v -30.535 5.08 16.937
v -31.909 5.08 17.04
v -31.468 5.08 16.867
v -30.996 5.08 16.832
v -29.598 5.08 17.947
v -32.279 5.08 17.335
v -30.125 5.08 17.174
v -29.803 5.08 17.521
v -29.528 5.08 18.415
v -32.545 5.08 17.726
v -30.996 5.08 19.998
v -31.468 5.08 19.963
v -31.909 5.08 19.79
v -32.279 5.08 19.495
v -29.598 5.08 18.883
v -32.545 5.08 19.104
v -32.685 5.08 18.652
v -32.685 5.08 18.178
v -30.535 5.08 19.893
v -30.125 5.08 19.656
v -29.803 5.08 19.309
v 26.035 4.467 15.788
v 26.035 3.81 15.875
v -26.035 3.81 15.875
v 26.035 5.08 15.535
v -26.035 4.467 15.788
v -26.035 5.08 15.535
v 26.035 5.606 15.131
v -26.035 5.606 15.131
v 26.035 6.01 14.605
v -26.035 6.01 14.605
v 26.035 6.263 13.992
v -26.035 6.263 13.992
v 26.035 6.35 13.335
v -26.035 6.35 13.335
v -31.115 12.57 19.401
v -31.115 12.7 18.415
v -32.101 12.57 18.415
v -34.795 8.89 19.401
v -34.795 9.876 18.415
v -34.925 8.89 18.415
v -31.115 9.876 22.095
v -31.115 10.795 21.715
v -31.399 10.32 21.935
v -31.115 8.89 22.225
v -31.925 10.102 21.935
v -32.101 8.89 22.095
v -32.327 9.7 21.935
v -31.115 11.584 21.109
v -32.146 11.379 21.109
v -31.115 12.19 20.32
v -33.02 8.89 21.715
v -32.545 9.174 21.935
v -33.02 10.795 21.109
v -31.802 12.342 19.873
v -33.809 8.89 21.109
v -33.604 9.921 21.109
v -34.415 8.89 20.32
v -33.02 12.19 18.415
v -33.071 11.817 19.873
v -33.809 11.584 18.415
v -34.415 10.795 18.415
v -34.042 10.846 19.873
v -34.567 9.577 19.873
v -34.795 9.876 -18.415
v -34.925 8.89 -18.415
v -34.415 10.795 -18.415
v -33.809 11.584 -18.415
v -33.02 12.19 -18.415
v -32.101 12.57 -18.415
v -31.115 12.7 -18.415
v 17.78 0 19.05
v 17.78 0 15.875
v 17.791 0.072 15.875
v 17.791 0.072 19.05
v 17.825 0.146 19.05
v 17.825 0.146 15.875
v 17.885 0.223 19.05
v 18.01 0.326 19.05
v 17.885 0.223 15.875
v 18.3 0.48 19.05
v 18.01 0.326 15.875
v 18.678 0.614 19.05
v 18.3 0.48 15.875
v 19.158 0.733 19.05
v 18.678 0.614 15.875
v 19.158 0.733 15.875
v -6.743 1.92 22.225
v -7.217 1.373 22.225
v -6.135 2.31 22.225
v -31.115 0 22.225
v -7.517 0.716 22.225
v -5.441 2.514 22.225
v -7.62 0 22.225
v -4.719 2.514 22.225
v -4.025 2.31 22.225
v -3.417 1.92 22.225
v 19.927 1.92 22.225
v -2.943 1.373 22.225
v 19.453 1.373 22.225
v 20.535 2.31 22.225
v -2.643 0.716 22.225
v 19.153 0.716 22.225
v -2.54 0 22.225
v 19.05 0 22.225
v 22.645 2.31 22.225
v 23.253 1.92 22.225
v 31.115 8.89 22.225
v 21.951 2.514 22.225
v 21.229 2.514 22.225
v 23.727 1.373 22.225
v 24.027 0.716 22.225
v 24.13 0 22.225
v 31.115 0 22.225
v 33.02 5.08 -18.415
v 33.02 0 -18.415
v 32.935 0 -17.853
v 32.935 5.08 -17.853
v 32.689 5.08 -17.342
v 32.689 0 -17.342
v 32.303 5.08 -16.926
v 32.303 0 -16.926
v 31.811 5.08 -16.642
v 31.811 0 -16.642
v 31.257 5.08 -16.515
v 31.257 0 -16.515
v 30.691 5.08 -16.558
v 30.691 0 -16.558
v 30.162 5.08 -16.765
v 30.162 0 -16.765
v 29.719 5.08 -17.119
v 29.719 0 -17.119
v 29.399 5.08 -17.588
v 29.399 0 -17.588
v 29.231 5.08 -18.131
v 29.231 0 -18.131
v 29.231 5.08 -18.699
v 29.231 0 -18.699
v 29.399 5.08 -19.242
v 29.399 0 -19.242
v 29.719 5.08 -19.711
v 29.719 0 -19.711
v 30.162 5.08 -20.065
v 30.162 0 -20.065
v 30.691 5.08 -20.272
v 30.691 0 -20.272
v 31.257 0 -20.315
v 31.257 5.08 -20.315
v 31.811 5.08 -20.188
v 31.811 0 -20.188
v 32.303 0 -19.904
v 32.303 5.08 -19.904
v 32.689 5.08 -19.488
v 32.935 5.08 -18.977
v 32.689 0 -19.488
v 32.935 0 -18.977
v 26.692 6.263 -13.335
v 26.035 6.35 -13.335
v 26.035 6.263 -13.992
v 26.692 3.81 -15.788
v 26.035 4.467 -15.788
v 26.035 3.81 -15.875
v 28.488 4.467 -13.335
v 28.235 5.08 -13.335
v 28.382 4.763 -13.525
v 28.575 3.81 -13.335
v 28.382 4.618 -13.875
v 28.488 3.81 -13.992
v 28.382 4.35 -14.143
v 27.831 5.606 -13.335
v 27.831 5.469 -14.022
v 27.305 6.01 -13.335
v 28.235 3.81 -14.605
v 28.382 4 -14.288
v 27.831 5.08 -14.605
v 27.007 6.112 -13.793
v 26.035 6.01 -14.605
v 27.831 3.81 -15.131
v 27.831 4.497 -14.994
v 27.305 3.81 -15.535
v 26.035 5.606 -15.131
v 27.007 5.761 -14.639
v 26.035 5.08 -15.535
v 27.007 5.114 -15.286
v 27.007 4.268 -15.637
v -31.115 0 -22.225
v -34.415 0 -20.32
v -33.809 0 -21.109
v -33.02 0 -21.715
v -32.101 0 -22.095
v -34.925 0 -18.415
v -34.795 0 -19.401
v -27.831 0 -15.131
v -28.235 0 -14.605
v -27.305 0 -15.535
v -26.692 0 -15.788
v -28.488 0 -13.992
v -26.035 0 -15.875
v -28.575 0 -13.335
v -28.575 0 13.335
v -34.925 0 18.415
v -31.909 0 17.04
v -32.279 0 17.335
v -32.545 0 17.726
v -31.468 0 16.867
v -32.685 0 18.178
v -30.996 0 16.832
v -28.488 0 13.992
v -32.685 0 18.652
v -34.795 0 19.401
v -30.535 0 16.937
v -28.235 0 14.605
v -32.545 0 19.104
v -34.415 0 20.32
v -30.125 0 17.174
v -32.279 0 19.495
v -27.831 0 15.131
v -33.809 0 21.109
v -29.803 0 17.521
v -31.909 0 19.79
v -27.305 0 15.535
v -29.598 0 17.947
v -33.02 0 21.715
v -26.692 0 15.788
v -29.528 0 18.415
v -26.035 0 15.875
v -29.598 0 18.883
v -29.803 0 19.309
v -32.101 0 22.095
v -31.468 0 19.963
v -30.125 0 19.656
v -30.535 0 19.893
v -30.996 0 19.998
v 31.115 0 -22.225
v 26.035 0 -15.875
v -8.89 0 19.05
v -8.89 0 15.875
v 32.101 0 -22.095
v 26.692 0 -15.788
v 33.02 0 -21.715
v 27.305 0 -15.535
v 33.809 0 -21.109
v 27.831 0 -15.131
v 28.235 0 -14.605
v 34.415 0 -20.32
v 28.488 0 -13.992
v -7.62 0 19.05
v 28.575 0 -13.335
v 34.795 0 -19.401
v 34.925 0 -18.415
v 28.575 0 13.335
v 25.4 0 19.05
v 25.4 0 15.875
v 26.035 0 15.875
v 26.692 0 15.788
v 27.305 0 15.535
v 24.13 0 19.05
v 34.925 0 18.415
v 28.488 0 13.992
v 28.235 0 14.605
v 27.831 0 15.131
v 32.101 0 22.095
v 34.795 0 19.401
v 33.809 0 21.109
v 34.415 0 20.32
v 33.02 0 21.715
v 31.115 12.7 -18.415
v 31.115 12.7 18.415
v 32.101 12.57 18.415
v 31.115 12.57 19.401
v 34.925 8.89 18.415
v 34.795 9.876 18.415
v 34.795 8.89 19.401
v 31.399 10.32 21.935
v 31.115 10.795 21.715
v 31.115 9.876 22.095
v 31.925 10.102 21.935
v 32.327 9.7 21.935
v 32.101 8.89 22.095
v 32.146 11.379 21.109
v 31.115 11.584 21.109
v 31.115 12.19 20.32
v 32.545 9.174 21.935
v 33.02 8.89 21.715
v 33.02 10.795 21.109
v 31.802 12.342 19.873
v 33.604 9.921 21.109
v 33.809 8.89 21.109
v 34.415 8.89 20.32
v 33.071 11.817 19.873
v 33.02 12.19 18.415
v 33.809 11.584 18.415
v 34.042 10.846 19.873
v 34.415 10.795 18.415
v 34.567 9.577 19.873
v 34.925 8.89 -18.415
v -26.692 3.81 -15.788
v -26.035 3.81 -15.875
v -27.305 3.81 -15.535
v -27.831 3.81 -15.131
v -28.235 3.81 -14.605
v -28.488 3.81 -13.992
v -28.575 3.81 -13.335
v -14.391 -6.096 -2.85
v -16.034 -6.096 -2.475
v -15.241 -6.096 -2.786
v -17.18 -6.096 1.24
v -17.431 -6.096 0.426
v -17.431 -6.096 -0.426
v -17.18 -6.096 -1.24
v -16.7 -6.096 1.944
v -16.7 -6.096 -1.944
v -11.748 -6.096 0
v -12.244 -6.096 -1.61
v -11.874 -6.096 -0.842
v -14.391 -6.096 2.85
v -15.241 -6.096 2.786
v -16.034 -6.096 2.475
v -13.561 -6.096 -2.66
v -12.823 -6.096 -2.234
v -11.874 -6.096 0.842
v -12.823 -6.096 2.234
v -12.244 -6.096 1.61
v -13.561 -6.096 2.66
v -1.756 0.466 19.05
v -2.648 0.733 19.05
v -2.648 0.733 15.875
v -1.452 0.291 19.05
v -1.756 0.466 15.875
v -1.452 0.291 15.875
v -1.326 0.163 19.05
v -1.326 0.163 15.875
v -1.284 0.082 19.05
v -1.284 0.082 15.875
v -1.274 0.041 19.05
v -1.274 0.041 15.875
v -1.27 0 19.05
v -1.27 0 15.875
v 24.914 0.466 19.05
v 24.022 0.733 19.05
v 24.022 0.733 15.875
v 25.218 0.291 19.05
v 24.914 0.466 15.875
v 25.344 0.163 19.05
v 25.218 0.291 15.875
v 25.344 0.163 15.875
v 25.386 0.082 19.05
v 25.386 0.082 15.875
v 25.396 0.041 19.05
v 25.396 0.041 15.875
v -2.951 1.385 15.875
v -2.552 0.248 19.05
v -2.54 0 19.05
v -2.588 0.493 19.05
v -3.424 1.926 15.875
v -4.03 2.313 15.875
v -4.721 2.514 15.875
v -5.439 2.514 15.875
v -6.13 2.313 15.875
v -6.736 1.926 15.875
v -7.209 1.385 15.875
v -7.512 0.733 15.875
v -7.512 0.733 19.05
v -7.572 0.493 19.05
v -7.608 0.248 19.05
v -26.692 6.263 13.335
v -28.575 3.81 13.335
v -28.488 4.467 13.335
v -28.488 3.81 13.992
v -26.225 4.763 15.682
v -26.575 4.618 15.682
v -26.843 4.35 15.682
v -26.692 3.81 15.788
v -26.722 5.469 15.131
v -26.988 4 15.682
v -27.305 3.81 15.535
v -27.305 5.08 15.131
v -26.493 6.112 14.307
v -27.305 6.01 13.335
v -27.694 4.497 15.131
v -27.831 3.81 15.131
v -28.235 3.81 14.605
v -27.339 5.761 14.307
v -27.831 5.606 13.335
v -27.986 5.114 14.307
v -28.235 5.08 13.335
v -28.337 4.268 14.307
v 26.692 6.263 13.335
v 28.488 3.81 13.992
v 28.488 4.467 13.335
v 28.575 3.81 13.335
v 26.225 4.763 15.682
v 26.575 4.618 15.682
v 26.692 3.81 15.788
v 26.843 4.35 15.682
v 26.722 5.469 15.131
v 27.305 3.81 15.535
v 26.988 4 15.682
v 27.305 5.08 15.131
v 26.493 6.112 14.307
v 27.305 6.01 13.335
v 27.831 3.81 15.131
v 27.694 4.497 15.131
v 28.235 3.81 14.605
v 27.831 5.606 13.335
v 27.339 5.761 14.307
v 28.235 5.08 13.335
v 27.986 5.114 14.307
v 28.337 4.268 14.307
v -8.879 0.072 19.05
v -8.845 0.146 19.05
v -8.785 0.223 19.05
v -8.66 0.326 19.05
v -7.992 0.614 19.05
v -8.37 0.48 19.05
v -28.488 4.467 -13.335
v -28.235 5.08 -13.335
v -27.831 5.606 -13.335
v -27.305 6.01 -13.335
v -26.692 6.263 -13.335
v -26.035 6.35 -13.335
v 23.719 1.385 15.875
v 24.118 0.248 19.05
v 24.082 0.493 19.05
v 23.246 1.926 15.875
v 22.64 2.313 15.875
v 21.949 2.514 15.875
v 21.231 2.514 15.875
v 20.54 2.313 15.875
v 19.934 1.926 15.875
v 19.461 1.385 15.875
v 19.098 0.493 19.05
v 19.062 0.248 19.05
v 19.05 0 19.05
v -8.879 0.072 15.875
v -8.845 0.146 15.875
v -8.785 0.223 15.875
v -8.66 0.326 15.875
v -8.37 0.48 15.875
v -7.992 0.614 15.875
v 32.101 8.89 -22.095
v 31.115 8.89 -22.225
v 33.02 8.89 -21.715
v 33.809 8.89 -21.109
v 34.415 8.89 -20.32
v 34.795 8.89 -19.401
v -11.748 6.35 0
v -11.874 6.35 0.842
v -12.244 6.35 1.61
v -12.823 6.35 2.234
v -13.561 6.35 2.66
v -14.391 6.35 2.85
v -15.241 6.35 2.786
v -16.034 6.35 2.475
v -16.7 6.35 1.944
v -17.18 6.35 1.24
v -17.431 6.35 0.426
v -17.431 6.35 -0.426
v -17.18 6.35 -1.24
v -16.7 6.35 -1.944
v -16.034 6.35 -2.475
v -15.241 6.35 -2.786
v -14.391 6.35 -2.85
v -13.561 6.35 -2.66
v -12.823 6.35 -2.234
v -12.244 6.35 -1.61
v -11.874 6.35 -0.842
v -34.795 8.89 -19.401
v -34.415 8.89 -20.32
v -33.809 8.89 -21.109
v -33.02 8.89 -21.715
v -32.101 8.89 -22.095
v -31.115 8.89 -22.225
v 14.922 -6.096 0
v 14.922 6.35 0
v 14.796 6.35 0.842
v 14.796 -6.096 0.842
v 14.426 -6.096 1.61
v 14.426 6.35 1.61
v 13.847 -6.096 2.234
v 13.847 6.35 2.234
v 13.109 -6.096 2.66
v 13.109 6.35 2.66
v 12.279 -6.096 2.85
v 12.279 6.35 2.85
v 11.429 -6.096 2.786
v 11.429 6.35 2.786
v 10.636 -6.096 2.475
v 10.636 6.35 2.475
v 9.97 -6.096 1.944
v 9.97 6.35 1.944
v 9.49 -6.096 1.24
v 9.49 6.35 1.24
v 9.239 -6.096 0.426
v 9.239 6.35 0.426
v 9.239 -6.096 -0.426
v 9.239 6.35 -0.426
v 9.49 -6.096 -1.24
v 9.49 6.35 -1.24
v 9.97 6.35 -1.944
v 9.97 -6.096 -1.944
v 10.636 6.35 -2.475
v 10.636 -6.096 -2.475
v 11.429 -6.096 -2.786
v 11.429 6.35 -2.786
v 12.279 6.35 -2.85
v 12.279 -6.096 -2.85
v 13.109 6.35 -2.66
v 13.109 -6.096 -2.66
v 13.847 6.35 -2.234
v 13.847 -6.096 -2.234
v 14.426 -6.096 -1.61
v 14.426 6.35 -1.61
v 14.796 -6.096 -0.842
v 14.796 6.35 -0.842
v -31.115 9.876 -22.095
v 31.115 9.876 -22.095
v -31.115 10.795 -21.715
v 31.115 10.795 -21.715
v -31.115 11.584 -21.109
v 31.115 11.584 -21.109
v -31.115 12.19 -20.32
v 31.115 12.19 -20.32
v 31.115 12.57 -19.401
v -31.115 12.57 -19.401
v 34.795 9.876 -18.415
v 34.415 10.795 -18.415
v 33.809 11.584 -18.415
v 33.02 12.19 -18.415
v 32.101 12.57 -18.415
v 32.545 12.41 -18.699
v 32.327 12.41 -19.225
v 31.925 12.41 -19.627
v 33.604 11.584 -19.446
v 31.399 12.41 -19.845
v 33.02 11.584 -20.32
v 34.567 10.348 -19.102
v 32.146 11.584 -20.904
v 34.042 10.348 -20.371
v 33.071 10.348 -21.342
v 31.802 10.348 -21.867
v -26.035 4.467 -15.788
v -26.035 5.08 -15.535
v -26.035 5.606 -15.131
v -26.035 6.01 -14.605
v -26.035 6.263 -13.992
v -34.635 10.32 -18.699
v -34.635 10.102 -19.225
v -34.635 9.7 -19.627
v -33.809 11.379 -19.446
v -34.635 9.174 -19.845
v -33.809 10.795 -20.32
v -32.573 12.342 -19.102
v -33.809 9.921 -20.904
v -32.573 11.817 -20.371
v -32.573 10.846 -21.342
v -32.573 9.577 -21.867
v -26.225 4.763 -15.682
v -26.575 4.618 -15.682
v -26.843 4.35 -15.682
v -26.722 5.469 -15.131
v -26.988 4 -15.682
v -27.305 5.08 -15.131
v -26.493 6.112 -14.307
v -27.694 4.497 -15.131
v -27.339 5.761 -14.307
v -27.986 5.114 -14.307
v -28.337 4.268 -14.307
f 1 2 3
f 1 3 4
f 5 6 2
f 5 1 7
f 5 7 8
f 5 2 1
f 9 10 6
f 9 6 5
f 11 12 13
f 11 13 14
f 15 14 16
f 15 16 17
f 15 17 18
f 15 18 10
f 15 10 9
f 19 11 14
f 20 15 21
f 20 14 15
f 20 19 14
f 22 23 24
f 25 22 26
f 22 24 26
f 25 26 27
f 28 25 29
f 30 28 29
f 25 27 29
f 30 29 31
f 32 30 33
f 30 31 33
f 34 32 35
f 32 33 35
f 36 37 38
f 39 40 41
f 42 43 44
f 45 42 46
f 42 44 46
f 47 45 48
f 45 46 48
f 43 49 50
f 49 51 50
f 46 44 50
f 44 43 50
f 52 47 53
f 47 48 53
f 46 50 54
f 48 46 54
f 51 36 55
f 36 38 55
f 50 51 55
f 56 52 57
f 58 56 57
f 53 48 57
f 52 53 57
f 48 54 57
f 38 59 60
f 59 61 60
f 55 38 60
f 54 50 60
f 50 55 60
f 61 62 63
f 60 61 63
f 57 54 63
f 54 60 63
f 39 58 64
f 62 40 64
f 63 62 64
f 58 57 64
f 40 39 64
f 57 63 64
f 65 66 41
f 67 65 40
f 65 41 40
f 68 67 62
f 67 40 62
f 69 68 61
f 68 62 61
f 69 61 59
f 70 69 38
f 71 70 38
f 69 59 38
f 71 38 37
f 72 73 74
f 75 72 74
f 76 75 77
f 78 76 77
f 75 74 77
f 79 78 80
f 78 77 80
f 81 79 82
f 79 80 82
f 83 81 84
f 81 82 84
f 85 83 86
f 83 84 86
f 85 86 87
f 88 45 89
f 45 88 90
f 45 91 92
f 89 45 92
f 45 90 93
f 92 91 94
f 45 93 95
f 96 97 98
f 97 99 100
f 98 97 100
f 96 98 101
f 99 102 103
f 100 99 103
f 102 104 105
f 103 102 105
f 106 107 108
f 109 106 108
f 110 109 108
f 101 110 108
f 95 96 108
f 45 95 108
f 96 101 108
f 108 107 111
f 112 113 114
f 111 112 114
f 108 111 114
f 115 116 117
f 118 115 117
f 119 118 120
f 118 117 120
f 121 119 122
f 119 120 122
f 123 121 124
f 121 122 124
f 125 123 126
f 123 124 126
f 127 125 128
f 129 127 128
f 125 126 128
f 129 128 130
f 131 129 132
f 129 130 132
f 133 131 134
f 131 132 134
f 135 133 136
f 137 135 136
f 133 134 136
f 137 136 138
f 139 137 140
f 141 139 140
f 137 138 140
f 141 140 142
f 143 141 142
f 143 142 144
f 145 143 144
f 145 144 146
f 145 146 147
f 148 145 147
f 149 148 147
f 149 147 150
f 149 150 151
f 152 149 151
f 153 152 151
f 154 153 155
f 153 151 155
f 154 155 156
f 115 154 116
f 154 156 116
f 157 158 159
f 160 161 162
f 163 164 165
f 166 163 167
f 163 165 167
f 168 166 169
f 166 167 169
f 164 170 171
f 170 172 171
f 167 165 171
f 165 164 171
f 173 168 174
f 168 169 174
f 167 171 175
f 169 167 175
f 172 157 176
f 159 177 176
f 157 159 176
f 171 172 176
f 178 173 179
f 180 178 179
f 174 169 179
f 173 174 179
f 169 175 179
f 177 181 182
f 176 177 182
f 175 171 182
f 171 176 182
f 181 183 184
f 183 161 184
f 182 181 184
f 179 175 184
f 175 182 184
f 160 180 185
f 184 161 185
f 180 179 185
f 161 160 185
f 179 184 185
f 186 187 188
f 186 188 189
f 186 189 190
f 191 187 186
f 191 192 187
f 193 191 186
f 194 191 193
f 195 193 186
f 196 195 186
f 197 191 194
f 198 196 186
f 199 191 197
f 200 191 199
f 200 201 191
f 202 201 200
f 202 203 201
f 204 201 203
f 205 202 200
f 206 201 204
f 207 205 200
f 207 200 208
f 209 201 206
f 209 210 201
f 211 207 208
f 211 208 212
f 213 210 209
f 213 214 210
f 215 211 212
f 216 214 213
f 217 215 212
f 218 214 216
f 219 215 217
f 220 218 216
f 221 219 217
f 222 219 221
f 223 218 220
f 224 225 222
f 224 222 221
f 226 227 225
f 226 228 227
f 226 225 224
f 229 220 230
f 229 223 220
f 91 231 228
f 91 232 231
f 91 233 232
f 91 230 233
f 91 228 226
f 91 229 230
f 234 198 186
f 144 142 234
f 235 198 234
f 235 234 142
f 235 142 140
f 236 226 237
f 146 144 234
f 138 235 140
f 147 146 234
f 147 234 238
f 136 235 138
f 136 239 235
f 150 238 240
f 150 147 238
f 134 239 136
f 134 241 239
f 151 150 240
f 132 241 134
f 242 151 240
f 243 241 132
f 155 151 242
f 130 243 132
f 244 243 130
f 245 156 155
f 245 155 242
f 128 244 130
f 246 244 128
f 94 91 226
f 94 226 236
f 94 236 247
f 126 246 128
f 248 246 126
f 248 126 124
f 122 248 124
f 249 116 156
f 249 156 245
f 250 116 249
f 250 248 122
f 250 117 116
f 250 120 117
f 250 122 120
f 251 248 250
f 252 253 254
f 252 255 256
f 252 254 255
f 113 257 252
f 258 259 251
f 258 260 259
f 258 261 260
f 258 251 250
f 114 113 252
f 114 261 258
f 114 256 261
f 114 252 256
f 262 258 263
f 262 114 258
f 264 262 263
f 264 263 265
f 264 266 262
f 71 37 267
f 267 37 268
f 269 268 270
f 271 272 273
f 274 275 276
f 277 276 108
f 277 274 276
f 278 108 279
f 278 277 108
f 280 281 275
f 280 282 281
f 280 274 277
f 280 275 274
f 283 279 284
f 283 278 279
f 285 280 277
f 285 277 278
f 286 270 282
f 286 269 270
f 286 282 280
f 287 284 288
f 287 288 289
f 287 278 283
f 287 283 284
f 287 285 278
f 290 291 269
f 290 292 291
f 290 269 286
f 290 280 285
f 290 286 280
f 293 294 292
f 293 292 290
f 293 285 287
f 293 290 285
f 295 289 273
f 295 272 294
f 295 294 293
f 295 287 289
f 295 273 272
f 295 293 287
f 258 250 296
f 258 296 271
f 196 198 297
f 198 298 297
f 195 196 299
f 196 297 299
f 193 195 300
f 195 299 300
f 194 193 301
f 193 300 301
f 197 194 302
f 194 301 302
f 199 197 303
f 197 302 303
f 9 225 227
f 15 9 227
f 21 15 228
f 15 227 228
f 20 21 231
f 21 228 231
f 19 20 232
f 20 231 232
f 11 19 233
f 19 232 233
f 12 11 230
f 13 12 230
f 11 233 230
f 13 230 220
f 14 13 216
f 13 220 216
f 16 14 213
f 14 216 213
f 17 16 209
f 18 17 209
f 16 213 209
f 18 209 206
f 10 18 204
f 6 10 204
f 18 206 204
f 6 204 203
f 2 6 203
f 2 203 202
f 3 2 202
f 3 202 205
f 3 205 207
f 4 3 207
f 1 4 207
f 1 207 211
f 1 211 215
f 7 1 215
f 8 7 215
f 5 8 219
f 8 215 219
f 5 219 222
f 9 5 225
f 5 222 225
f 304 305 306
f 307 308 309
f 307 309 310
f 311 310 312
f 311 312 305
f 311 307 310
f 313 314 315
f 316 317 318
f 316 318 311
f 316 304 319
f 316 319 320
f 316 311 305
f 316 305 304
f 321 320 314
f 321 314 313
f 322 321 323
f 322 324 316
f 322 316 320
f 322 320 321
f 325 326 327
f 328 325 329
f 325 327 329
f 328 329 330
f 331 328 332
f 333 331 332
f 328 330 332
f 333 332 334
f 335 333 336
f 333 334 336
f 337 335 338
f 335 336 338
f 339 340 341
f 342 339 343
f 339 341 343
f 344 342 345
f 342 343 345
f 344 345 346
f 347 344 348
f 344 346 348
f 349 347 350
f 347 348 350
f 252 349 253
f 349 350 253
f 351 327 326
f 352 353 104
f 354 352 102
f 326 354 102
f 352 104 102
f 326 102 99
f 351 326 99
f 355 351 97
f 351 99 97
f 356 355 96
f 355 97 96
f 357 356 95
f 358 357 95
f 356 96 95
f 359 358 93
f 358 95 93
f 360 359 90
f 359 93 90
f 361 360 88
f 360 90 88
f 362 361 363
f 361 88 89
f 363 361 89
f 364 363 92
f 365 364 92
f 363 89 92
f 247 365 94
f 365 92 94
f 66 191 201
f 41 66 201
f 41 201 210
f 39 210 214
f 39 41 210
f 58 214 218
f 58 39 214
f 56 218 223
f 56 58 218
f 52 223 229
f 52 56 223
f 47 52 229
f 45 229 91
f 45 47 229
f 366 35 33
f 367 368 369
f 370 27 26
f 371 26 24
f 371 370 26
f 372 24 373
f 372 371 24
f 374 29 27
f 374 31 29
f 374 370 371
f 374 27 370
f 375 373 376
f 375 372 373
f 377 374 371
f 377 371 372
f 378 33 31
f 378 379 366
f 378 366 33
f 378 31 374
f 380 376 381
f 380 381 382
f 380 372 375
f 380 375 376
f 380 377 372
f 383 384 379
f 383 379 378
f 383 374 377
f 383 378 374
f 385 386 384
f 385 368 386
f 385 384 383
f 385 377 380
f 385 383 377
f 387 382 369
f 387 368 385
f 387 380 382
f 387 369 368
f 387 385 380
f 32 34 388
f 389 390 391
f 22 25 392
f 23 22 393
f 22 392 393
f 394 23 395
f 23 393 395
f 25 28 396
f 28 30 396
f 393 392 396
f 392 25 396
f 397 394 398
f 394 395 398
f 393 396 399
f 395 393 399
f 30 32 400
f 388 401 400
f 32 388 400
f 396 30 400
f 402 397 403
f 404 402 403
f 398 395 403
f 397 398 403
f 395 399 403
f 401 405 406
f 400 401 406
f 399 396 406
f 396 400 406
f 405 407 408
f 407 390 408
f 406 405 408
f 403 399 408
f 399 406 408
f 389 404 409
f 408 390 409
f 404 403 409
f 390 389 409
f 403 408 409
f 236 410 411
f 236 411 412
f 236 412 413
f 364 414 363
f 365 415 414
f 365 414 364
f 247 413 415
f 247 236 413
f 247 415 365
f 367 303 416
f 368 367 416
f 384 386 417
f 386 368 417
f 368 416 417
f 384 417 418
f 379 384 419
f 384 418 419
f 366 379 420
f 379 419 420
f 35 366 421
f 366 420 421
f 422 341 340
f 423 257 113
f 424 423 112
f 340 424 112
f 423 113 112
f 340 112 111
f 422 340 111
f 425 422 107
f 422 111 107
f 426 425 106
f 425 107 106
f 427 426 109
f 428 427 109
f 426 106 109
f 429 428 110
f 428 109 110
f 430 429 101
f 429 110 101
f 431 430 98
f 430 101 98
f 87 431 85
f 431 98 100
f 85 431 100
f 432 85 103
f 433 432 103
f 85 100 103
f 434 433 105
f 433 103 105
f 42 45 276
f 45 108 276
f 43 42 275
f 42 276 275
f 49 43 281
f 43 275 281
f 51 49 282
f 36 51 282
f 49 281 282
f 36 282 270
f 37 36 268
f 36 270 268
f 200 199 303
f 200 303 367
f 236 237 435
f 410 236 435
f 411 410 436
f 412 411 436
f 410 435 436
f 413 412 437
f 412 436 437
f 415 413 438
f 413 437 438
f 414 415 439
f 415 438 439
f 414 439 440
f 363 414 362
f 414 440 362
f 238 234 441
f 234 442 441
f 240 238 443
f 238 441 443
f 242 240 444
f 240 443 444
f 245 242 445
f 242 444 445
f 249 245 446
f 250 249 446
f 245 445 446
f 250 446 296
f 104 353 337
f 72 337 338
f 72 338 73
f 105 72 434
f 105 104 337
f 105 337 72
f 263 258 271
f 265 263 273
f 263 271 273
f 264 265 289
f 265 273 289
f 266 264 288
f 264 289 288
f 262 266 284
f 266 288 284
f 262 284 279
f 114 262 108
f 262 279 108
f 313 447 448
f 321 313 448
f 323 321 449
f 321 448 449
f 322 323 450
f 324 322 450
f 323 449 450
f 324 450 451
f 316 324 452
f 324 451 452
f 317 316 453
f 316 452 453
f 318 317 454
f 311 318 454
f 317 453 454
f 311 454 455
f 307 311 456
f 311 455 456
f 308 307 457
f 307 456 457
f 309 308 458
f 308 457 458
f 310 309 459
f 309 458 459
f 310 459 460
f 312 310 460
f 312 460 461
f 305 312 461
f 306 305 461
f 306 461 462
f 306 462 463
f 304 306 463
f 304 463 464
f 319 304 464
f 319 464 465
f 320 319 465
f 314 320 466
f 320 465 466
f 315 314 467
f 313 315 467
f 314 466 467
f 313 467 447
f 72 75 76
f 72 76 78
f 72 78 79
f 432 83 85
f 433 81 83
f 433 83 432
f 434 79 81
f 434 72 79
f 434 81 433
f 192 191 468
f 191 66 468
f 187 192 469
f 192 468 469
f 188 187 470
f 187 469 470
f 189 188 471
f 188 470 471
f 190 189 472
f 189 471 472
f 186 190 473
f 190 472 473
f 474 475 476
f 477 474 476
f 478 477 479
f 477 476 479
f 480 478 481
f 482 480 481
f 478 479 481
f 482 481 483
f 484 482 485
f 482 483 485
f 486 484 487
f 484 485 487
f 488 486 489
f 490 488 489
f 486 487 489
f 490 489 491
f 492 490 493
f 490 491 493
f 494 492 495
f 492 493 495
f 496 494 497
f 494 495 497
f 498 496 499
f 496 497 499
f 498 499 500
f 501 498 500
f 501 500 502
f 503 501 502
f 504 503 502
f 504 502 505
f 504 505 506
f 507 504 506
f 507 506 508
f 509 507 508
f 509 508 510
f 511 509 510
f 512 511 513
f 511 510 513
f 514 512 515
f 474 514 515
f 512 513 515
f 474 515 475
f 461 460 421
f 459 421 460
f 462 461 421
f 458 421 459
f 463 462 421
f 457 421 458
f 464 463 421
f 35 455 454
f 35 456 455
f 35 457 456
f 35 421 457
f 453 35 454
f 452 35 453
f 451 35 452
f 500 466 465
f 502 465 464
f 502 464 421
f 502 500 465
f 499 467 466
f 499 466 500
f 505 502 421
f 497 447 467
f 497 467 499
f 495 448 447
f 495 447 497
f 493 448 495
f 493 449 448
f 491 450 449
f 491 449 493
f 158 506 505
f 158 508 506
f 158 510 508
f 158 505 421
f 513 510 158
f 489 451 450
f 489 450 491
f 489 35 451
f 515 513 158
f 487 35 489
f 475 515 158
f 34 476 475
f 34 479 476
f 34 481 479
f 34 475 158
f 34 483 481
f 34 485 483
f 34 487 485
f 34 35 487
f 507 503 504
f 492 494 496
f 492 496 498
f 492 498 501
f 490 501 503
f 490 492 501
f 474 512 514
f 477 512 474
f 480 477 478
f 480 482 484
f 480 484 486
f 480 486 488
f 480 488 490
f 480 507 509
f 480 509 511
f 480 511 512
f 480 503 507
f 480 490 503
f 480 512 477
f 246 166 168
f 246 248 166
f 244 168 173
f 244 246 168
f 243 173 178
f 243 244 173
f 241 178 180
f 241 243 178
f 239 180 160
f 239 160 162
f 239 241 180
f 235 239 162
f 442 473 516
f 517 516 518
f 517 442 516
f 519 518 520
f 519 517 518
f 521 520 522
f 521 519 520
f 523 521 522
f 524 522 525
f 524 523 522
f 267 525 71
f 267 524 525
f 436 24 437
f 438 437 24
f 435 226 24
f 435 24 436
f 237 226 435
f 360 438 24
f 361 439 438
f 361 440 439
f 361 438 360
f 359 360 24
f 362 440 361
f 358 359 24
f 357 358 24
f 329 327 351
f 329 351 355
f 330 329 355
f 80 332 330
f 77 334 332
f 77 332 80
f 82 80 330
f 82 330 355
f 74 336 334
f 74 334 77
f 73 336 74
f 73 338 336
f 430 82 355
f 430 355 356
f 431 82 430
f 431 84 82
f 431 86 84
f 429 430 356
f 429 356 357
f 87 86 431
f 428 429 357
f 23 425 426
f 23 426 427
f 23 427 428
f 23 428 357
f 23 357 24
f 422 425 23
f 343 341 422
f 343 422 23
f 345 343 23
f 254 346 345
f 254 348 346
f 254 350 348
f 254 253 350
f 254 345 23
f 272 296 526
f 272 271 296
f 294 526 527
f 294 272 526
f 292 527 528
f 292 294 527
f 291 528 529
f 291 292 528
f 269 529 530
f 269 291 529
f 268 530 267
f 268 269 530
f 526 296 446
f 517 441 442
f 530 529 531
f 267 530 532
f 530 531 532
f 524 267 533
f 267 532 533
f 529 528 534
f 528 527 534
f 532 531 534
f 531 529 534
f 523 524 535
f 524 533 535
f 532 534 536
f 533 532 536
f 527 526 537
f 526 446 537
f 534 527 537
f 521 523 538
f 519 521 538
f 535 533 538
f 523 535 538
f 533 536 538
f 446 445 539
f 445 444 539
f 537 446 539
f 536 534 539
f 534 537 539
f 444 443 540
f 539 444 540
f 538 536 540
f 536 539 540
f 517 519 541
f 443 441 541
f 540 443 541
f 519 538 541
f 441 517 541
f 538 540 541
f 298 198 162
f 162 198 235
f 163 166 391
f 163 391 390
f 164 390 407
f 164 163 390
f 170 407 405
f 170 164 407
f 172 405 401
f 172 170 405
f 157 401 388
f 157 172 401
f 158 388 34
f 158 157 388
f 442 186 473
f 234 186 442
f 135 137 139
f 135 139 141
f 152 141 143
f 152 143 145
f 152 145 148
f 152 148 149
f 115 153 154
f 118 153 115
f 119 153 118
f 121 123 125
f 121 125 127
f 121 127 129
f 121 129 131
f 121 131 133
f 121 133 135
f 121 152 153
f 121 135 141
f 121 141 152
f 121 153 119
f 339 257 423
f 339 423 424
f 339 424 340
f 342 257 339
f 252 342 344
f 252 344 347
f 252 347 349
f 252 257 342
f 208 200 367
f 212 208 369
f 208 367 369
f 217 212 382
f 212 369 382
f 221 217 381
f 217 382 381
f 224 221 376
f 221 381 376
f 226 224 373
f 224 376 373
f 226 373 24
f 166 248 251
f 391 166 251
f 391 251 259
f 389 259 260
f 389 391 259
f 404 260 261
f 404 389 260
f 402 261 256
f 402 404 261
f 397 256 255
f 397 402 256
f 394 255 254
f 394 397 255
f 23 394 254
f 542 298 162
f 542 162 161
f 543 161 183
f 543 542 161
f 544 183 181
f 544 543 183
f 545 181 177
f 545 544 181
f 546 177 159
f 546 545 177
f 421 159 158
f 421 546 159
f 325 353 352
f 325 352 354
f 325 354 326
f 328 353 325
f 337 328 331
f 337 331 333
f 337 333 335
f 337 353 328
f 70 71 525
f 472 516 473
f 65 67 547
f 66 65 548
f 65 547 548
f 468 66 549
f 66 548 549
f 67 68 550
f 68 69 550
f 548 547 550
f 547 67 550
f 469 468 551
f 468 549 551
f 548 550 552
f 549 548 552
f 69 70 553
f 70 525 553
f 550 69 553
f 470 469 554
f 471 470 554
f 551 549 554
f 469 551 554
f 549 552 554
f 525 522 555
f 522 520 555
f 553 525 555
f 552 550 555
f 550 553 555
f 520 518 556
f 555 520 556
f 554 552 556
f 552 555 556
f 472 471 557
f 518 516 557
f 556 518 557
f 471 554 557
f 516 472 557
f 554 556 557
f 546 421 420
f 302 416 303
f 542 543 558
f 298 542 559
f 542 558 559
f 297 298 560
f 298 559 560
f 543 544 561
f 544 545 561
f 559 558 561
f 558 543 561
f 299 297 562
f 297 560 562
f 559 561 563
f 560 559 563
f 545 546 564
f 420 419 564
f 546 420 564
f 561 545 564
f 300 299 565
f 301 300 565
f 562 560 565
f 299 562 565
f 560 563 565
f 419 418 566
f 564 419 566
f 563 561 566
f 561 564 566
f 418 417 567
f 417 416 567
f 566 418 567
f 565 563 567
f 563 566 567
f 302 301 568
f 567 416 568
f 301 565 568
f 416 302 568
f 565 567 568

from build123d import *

# Parameters (mm, degrees)
F0_W      = 69.85
F0_H      = 44.45
F1_DEPTH  = 12.7
F2_T      = -6.35
F3_R      = 3.81
F4_R      = 2.54
F5_R      = 1.5875
F5_R_2    = 1.905
F6_DEPTH  = 5.08
F7_R      = 2.8575
F8_DEPTH  = 12.446
F9_R      = 2.54
F10_DEPTH = 6.35
F12_DEPTH = 3.175


# Not quite as in the source:
# - a feature names something its author has since deleted; it is built from what else it names


with BuildPart() as f1:
    # F0 (on Front) → F1 (new body)
    with BuildSketch(Plane.XZ):
        Rectangle(F0_W, F0_H)
    extrude(amount=-F1_DEPTH)

    # F2
    f2_openings = [f1.faces().sort_by_distance(p)[0] for p in [
        (0, 0, 0),
    ]]
    offset(amount=F2_T, openings=f2_openings)

    # F3
    f3_edges = [f1.edges().sort_by_distance(p)[0] for p in [
        (34.925, 6.35, -22.225),
        (34.925, 12.7, 0),
        (0, 12.7, -22.225),
        (-34.925, 12.7, 0),
        (0, 12.7, 22.225),
        (-34.925, 6.35, 22.225),
        (34.925, 6.35, 22.225),
        (-34.925, 6.35, -22.225),
    ]]
    fillet(f3_edges, radius=F3_R)

    # F4
    f4_edges = [f1.edges().sort_by_distance(p)[0] for p in [
        (-28.575, 6.35, 0),
        (0, 6.35, -15.875),
        (28.575, 6.35, 0),
        (0, 6.35, 15.875),
        (-28.575, 3.175, -15.875),
        (28.575, 3.175, -15.875),
        (28.575, 3.175, 15.875),
        (-28.575, 3.175, 15.875),
    ]]
    fillet(f4_edges, radius=F4_R)

    # F5 (on face) → F6 (cut)
    with BuildSketch(Plane.XZ):
        with Locations((-31.115, 18.415)):
            Circle(F5_R)
        with Locations((31.115, -18.415)):
            Circle(F5_R_2)
    extrude(amount=-F6_DEPTH, mode=Mode.SUBTRACT)

    # F7 (on face) → F8 (join)
    with BuildSketch(Plane.XZ.offset(-6.35)):
        with Locations((-14.605, 0)):
            Circle(F7_R)
        with Locations((12.065, 0)):
            Circle(F7_R)
    extrude(amount=F8_DEPTH)

    # F9 (on face) → F10 (cut, through all)
    with BuildSketch(Plane.XY.offset(22.225)):
        with Locations((-5.08, 0)):
            Circle(F9_R)
        with Locations((21.59, 0)):
            Circle(F9_R)
    extrude(amount=-F10_DEPTH, mode=Mode.SUBTRACT)

    # F11 (on face) → F12 (cut)
    with BuildSketch(Plane(origin=(0, 0, 15.875), x_dir=(1, 0, 0), z_dir=(0, 0, -1))):
        with BuildLine():
            add(Edge.make_bspline(
                [(-8.89, 0), (-8.89, -1.6497783942), (-3.175, -0.8248891971), (2.54, 0), (-3.175, 0.8248891971), (-8.89, 1.6497783942), (-8.89, 0)],
                knots=[0, 0, 0, 2.0943951024, 2.0943951024, 4.1887902048, 4.1887902048, 6.2831853072, 6.2831853072, 6.2831853072], degree=2, weights=[1, 0.5, 1, 0.5, 1, 0.5, 1]))
        make_face()
        with BuildLine():
            add(Edge.make_bspline(
                [(17.78, 0), (17.78, -1.6497783942), (23.495, -0.8248891971), (29.21, 0), (23.495, 0.8248891971), (17.78, 1.6497783942), (17.78, 0)],
                knots=[0, 0, 0, 2.0943951024, 2.0943951024, 4.1887902048, 4.1887902048, 6.2831853072, 6.2831853072, 6.2831853072], degree=2, weights=[1, 0.5, 1, 0.5, 1, 0.5, 1]))
        make_face()
    extrude(amount=-F12_DEPTH, mode=Mode.SUBTRACT)


solid = f1.part
